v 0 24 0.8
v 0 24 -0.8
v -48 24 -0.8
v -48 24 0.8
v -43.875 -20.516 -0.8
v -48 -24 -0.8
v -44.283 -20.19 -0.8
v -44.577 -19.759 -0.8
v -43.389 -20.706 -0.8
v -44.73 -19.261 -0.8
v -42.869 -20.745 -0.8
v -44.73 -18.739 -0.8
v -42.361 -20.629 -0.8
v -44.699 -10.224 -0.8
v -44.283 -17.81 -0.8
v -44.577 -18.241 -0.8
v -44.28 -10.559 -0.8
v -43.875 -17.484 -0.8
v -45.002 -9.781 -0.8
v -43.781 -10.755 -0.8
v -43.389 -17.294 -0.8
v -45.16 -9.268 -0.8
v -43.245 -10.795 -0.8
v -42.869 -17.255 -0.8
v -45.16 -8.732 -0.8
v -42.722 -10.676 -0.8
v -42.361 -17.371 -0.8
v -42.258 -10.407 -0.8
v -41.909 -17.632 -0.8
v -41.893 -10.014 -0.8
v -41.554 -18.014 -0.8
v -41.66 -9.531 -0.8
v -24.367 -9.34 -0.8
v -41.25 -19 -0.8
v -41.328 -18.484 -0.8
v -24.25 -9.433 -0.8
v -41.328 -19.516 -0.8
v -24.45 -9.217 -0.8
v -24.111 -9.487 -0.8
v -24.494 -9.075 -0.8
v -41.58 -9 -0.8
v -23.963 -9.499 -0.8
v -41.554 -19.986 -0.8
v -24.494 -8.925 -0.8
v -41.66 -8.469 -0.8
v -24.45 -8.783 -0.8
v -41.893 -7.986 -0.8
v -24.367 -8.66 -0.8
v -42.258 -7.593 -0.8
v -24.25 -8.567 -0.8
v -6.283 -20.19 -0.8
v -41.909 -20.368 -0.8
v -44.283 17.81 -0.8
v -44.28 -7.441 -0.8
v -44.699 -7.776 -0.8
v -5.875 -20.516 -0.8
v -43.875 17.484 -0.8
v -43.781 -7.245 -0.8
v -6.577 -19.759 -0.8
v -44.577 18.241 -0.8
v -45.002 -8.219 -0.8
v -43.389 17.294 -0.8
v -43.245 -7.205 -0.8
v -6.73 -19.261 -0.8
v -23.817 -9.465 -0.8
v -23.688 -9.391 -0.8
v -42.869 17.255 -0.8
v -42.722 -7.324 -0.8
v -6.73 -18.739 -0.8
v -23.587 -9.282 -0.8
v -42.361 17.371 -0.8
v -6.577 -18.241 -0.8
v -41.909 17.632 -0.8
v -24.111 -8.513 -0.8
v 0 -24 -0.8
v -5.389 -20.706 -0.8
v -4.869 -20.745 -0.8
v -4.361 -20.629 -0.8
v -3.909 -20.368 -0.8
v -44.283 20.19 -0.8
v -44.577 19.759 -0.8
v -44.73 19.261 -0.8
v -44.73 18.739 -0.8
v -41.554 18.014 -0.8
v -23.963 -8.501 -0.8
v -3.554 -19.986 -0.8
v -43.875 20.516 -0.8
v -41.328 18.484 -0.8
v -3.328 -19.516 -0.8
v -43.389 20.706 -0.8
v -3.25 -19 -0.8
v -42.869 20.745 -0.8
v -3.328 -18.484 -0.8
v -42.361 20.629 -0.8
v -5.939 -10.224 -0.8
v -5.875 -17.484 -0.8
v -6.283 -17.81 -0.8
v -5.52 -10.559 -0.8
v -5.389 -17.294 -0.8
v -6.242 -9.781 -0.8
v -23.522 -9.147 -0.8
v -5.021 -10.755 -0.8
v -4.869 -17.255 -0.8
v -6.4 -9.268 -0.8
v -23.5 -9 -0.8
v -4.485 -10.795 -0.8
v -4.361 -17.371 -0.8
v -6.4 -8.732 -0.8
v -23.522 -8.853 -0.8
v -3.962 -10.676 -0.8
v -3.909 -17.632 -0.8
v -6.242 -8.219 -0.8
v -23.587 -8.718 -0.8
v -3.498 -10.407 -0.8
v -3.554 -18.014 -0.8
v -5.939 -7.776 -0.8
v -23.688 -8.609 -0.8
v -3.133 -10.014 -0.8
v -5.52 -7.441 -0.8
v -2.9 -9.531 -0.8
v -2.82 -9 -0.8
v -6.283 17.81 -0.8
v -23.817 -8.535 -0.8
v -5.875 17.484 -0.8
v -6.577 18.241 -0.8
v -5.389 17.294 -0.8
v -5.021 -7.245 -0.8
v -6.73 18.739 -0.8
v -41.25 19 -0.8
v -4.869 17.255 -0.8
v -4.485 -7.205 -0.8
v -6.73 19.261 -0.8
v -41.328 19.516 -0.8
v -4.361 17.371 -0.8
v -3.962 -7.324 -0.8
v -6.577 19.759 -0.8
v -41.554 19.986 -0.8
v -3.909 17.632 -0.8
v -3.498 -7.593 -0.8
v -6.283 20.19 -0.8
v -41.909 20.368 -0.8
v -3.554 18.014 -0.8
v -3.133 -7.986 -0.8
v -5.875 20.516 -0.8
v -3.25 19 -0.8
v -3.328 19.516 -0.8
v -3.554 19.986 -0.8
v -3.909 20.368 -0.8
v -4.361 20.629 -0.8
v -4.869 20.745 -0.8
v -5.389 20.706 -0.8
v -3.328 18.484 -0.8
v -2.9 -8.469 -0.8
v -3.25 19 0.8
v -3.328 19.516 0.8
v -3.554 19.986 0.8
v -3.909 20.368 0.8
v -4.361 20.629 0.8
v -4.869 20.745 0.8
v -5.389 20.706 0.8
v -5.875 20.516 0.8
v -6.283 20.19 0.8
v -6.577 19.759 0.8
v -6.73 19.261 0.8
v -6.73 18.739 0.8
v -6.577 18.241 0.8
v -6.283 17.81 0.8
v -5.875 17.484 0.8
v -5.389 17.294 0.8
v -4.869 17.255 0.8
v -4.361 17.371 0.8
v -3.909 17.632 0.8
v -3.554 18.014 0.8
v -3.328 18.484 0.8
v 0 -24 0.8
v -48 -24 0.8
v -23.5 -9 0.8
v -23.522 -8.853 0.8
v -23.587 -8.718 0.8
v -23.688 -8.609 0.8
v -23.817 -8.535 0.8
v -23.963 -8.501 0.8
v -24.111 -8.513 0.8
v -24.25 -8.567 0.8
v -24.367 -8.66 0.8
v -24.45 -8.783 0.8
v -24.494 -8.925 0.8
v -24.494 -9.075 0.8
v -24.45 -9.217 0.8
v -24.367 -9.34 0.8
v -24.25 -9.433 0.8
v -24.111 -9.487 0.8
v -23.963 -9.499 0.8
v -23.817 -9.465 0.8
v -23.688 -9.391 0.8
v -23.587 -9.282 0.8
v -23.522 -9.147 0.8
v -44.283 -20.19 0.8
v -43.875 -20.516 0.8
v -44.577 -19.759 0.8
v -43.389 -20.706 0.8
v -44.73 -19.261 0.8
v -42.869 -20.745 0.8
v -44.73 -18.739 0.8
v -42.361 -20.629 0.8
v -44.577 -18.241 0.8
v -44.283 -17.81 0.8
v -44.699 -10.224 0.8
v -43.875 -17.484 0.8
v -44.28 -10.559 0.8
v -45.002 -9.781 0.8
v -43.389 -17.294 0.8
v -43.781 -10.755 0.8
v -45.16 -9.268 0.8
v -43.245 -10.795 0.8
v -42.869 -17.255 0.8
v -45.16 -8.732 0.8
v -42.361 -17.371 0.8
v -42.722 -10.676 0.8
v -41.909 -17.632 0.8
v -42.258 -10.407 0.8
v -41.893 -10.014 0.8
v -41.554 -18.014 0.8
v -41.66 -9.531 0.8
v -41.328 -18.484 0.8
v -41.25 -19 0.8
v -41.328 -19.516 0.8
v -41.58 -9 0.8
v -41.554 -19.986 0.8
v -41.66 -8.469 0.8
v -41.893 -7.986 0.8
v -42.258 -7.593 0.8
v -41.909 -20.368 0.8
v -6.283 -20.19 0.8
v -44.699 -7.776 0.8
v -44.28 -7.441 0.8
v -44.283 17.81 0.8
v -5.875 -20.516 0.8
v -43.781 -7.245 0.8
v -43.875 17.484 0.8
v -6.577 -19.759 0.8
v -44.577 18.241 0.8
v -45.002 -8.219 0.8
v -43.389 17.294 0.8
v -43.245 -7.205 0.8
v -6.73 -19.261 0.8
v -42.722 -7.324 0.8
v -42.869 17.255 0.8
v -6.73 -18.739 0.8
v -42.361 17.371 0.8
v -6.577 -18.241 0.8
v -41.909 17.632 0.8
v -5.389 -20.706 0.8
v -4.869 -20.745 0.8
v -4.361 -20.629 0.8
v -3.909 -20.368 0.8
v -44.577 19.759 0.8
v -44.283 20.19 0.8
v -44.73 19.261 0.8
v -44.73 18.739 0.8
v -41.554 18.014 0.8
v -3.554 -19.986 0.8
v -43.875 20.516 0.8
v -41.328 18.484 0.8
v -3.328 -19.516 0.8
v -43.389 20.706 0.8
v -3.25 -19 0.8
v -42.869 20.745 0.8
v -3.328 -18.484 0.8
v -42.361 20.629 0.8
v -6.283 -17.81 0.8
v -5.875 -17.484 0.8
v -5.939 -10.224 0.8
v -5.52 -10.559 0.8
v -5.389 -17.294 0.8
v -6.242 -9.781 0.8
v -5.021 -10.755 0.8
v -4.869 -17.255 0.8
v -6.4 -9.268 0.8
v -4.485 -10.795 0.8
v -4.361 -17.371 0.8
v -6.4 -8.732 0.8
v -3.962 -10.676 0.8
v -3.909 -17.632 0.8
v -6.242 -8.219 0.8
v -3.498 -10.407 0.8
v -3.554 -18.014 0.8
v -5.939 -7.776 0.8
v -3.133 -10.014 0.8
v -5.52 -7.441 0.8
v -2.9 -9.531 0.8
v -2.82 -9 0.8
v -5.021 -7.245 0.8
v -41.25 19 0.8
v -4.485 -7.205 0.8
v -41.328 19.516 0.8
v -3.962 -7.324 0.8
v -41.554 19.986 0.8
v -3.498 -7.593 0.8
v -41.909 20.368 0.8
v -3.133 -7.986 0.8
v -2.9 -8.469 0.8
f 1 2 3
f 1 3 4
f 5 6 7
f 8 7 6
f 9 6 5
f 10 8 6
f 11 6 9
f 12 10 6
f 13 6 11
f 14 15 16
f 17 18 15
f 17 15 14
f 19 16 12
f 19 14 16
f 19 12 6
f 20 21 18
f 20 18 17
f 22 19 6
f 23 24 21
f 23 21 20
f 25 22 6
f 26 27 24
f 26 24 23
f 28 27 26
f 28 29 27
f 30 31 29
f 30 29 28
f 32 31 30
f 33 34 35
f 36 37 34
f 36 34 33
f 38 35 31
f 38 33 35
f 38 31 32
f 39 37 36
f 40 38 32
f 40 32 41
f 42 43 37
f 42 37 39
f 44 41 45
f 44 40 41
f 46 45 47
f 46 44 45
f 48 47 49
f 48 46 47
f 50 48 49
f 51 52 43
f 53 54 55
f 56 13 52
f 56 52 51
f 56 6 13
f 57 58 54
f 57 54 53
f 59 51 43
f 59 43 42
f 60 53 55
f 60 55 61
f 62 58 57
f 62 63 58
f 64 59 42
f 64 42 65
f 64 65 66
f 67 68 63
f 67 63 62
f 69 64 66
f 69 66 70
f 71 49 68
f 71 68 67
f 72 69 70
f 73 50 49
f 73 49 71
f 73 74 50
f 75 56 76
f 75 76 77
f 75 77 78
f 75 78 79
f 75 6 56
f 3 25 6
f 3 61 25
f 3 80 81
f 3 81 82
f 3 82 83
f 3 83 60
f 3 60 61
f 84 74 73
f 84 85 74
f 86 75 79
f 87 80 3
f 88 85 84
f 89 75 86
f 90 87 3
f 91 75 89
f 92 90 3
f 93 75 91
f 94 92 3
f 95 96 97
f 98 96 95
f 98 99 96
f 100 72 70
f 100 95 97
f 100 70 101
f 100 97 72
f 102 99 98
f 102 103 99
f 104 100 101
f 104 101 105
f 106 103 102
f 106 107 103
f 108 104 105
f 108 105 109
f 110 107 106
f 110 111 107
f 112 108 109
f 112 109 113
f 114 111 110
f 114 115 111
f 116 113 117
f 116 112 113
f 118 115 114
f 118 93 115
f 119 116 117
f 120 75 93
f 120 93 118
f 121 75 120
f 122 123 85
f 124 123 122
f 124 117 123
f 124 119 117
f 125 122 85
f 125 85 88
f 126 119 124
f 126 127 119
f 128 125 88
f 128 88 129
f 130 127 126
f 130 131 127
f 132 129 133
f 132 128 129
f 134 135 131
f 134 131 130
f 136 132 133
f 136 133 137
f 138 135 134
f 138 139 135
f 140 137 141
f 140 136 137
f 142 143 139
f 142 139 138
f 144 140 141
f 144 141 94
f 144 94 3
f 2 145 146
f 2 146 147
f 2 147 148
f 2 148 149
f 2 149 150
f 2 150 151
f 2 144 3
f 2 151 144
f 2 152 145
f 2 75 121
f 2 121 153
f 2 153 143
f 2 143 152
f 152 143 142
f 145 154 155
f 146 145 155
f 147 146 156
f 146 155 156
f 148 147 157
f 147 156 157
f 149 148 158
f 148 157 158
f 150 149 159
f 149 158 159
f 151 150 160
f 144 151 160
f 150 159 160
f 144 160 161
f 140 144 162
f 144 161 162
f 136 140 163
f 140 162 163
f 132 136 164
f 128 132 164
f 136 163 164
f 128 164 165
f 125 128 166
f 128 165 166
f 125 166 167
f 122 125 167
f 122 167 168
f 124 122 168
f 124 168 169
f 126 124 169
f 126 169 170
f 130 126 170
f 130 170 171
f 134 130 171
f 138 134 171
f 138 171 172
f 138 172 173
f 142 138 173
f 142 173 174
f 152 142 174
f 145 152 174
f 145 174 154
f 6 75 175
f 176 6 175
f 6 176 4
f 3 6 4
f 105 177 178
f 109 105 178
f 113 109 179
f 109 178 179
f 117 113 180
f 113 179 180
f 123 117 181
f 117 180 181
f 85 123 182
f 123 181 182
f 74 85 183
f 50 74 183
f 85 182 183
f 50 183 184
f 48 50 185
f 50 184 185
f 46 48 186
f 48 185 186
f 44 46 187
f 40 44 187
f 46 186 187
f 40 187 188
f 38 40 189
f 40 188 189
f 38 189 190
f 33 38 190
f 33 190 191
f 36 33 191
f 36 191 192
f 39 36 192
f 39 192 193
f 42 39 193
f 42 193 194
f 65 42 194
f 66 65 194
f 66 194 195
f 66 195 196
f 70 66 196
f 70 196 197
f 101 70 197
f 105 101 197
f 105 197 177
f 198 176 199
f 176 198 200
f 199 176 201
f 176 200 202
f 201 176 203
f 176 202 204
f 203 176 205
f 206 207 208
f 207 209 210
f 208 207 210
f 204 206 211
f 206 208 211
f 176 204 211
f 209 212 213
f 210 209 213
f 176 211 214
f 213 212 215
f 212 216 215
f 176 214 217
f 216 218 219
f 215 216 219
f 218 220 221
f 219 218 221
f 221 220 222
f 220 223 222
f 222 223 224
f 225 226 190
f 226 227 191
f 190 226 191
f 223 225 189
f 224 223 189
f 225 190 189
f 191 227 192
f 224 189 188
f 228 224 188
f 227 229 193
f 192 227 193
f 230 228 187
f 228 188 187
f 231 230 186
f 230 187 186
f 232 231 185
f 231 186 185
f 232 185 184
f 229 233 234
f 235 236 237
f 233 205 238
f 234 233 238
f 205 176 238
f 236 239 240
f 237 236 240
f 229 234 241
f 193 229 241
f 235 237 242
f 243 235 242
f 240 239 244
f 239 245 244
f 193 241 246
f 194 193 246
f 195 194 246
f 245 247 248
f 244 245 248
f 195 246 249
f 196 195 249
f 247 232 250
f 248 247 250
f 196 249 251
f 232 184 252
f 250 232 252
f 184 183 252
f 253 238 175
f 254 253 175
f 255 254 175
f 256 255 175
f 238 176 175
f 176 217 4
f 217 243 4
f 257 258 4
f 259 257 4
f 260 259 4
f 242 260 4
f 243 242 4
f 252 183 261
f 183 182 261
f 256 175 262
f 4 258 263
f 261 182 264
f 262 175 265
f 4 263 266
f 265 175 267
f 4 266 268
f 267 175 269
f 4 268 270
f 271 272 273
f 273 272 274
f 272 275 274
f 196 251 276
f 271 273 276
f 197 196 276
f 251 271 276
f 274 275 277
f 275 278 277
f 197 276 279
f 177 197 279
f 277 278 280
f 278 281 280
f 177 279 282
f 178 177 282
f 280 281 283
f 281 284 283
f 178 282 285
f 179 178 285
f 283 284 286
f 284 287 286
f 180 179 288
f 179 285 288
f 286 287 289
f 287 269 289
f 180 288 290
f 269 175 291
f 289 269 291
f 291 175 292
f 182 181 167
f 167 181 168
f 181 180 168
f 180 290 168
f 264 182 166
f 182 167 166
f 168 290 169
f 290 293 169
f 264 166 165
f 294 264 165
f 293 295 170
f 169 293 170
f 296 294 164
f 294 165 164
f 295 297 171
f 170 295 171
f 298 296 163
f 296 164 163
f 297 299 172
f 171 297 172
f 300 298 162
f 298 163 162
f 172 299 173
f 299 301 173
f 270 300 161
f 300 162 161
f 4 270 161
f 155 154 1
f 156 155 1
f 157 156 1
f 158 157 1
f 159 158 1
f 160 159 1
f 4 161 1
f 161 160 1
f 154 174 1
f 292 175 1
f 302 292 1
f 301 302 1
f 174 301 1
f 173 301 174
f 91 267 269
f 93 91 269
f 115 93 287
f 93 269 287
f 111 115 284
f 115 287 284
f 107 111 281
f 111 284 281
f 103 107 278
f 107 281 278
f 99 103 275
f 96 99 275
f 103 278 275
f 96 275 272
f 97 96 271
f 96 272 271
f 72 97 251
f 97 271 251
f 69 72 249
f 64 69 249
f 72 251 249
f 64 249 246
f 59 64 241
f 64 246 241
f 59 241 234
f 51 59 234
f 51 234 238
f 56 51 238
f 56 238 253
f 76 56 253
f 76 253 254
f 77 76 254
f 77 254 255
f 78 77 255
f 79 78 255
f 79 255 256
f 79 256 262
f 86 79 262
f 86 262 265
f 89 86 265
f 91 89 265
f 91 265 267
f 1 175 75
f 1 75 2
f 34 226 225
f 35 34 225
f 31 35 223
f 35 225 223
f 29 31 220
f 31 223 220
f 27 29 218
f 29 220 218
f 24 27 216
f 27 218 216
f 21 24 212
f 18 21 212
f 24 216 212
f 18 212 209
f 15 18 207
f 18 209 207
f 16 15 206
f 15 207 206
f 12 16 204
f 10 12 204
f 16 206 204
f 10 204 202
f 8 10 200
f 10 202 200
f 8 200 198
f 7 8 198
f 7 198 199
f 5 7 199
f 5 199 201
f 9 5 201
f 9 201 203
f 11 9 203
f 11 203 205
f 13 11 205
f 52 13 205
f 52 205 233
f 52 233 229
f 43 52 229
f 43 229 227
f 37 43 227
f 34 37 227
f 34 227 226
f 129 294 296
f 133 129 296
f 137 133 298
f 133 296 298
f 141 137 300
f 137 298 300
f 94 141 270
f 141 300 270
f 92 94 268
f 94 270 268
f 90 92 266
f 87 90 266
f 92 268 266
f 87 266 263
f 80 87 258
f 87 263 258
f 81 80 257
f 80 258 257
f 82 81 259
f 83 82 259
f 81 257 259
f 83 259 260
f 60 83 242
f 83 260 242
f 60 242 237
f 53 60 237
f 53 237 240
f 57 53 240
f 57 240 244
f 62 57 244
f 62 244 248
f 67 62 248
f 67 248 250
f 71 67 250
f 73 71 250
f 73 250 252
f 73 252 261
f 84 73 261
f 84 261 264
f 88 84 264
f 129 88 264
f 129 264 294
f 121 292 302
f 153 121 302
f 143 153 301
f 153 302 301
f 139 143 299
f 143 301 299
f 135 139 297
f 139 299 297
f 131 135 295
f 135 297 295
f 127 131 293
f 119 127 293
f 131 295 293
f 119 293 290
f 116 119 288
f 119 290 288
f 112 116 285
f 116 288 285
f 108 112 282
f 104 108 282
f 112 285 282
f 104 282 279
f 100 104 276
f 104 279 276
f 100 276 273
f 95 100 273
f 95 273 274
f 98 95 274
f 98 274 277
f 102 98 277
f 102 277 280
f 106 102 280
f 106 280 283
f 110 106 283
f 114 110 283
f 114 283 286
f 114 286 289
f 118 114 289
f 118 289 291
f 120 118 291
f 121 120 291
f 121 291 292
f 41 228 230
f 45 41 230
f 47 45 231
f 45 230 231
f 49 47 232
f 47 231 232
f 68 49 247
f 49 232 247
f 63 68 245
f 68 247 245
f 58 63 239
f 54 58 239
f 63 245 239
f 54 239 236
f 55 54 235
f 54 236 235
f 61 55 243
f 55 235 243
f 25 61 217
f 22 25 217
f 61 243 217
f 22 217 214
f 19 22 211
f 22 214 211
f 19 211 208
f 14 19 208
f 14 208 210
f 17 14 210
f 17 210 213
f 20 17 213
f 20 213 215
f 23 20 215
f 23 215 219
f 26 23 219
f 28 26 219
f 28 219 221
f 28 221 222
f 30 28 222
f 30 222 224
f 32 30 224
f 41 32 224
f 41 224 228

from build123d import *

# Parameters (mm, degrees)
F0_W     = 48
F0_H     = 1.6
F1_DEPTH = 48
F2_R     = 1.75
F2_R_2   = 1.8
F2_R_3   = 0.5
F3_DEPTH = 1.601
F4_W     = 48
F4_H     = 48
F4_R     = 1.75
F4_W_2   = 20
F4_H_2   = 9
F5_DEPTH = 5


with BuildPart() as f1:
    # F0 (on Right) → F1 (new body)
    with BuildSketch(Plane.YZ):
        Rectangle(F0_W, F0_H)
    extrude(amount=-F1_DEPTH)

    # F2 (on face) → F3 (cut, through all)
    with BuildSketch(Plane.XY.offset(0.8)):
        with Locations((-43, -19)):
            Circle(F2_R)
        with Locations((-43, 19)):
            Circle(F2_R)
        with Locations((-43.38, -9)):
            Circle(F2_R_2)
        with Locations((-4.62, -9)):
            Circle(F2_R_2)
        with Locations((-5, 19)):
            Circle(F2_R)
        with Locations((-5, -19)):
            Circle(F2_R)
        with Locations((-24, -9)):
            Circle(F2_R_3)
    extrude(amount=-F3_DEPTH, mode=Mode.SUBTRACT)


with BuildPart() as f5:
    # F4 (on Top) → F5 (new body)
    with BuildSketch(Plane.XY):
        Rectangle(F4_W, F4_H)
        with Locations((-19, -19)):
            Circle(F4_R, mode=Mode.SUBTRACT)
        with Locations((19, -19)):
            Circle(F4_R, mode=Mode.SUBTRACT)
        with Locations((-19, 19)):
            Circle(F4_R, mode=Mode.SUBTRACT)
        with Locations((0, 14.5)):
            Rectangle(F4_W_2, F4_H_2, mode=Mode.SUBTRACT)
        with Locations((19, 19)):
            Circle(F4_R, mode=Mode.SUBTRACT)
    extrude(amount=F5_DEPTH)


solid = f1.part
